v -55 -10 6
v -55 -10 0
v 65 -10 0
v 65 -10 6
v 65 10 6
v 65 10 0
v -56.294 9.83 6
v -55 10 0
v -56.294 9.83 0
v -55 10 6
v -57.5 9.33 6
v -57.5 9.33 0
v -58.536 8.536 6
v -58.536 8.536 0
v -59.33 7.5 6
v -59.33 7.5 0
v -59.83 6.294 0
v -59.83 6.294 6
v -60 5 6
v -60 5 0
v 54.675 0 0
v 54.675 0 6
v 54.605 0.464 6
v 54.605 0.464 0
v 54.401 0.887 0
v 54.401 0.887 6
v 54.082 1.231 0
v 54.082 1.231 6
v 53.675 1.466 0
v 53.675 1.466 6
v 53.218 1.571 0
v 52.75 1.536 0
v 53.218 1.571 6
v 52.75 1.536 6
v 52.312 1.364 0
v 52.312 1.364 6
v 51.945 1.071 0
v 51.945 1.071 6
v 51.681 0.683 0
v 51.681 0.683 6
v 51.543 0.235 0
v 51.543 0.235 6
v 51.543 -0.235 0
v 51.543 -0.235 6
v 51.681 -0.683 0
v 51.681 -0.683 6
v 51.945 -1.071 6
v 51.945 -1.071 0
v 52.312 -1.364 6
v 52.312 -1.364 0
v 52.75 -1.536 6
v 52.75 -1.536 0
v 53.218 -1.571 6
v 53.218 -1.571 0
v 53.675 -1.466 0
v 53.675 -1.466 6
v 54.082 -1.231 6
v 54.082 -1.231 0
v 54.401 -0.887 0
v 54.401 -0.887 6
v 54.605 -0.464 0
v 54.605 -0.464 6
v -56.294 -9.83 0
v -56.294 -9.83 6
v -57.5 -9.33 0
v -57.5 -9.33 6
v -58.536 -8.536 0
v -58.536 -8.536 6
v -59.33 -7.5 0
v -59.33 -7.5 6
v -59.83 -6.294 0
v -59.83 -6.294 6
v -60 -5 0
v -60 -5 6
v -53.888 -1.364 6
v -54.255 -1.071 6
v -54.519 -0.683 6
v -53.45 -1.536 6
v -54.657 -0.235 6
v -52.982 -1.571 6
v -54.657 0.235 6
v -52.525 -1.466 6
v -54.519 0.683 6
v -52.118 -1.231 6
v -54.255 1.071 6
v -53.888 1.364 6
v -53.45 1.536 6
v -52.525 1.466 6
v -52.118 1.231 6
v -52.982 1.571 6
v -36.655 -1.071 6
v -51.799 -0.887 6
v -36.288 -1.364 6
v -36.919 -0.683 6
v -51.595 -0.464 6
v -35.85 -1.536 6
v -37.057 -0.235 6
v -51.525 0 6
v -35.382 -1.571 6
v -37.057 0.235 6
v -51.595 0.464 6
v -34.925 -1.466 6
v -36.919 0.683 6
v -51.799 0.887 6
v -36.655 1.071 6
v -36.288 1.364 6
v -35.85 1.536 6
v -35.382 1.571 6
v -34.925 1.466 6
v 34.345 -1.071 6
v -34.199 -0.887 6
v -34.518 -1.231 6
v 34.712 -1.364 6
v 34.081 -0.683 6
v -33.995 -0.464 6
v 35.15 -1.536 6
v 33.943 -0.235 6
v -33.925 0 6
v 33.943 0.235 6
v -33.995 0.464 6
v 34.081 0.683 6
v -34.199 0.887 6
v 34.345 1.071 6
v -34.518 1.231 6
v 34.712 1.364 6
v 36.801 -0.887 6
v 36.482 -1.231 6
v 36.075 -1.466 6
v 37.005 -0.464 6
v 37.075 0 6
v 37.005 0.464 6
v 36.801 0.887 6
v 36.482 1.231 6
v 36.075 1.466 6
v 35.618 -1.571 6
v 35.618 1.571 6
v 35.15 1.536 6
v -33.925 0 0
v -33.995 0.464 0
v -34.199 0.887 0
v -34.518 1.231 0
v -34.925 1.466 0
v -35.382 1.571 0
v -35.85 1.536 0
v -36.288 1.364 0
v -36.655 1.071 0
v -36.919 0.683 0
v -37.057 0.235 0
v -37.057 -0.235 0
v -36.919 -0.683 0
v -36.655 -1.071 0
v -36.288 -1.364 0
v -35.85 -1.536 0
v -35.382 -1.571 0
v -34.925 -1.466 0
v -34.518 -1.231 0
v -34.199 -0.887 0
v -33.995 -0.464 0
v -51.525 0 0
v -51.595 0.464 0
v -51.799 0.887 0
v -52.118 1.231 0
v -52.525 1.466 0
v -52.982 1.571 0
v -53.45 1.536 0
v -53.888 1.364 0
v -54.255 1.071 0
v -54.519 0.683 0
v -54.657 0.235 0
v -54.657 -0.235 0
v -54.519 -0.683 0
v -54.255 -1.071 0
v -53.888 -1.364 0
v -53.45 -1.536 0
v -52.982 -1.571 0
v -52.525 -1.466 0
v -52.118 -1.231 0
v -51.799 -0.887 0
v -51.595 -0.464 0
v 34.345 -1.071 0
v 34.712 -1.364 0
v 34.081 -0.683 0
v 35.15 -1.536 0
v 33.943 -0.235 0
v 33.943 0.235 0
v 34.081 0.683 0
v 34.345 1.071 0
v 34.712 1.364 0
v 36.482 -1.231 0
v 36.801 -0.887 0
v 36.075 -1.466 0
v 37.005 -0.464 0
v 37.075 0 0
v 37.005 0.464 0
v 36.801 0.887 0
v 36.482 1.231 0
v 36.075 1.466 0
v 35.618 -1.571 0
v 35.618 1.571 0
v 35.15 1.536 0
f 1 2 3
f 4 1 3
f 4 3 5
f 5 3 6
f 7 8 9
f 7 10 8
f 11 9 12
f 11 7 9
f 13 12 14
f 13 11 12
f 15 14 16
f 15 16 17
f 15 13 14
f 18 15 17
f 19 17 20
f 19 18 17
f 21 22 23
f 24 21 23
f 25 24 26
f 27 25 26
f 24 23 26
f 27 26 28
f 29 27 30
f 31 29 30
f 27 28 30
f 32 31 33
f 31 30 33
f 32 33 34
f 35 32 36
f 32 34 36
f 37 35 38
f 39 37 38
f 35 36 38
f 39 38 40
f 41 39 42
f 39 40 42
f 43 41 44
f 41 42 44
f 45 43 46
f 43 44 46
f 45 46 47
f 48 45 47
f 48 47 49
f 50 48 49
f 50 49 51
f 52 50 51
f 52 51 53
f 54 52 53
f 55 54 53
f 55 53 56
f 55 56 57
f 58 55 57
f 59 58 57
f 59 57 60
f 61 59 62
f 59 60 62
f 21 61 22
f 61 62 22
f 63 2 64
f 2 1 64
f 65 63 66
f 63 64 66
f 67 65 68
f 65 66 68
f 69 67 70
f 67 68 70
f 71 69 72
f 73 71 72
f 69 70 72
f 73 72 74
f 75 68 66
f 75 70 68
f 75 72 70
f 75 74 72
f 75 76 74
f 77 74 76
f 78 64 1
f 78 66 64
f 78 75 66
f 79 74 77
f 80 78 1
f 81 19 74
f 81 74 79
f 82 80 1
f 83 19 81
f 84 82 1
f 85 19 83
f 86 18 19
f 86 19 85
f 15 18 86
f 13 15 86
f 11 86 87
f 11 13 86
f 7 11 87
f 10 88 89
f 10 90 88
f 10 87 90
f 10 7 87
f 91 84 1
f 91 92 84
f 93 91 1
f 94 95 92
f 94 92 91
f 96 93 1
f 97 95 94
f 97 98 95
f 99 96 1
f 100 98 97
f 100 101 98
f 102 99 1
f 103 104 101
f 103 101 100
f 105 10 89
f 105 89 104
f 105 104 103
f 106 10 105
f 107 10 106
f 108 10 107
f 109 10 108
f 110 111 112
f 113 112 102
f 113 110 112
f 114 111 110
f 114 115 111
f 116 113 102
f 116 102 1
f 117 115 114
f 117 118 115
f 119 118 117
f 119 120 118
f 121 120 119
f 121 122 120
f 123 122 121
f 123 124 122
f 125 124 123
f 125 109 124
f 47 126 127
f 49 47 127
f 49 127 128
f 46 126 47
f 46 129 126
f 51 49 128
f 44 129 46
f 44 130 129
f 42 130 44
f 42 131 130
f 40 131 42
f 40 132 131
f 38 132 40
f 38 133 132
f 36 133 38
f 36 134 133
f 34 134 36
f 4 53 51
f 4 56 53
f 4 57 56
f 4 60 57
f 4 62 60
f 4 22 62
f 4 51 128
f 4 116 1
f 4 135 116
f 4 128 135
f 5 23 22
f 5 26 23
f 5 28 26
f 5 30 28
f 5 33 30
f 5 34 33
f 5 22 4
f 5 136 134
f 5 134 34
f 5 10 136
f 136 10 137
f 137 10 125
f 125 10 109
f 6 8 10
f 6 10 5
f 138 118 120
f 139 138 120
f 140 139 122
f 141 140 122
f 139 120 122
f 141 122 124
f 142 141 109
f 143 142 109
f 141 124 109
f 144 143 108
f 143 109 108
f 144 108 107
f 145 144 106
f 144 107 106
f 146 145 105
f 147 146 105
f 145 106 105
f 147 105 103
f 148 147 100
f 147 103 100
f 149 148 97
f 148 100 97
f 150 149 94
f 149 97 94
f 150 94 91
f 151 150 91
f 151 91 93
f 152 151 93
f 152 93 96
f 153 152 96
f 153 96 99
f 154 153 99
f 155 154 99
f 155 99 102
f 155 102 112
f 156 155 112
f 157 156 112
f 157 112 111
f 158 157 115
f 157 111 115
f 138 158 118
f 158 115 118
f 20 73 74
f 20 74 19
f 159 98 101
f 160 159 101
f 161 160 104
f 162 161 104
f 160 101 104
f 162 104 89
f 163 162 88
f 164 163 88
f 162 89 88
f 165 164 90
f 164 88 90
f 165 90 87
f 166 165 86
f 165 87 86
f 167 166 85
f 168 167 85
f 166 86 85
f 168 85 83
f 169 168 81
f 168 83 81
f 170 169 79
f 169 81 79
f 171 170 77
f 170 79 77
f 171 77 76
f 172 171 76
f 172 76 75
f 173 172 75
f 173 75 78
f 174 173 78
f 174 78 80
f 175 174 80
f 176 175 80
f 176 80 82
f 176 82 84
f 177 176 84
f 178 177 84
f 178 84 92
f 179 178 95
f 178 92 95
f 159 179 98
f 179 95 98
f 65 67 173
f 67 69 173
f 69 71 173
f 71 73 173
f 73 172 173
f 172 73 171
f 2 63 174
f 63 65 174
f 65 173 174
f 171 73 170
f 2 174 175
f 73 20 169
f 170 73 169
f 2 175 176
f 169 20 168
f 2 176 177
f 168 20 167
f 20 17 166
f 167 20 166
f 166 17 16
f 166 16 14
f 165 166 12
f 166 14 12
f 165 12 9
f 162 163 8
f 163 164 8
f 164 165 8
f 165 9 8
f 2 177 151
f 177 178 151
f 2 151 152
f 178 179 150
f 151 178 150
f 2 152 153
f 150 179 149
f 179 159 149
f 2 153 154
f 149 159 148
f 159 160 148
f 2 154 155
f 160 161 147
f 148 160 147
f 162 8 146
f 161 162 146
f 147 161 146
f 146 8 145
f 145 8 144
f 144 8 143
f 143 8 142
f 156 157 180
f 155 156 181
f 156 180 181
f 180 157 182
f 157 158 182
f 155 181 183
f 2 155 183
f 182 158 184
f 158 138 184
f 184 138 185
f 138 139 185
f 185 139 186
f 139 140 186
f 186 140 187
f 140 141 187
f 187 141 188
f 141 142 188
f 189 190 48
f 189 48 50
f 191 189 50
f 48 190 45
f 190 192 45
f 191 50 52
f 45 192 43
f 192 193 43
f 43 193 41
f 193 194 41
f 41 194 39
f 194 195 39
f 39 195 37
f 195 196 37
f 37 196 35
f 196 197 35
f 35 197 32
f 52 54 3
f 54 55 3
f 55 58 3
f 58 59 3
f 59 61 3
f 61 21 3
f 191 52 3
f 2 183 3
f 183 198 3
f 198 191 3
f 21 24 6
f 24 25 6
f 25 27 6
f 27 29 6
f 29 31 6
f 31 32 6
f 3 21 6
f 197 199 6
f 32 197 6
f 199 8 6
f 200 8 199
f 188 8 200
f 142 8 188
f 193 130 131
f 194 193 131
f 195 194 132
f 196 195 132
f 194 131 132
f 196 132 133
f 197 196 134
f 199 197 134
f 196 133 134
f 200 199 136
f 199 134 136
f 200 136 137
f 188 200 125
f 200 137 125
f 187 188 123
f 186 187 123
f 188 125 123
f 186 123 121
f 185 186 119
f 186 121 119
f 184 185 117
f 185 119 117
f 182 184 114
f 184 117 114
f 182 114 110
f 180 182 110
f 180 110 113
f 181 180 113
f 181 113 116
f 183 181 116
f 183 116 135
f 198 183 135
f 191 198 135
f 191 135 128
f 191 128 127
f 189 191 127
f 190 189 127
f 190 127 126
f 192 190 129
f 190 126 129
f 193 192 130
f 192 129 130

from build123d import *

# Parameters (mm, degrees)
F0_W     = 120
F0_H     = 20
F1_DEPTH = 6
F2_R     = 1.575
F3_DEPTH = 6
F4_W     = 5
F4_H     = 20
F5_DEPTH = 6
F6_R     = 5


with BuildPart() as f1:
    # F0 (on Top) → F1 (new body)
    with BuildSketch(Plane.XY):
        Rectangle(F0_W, F0_H)
    extrude(amount=F1_DEPTH)

    # F2 (on face) → F3 (cut, through all)
    with BuildSketch(Plane.XY.offset(6)):
        with Locations((-53.1, 0)):
            Circle(F2_R)
        with Locations((-35.5, 0)):
            Circle(F2_R)
        with Locations((53.1, 0)):
            Circle(F2_R)
        with Locations((35.5, 0)):
            Circle(F2_R)
    extrude(amount=-F3_DEPTH, mode=Mode.SUBTRACT)

    # F4 (on Top) → F5 (join, through all)
    with BuildSketch(Plane.XY):
        with Locations((62.5, 0)):
            Rectangle(F4_W, F4_H)
    extrude(amount=F5_DEPTH)

    # F6
    f6_edges = [f1.edges().sort_by_distance(p)[0] for p in [
        (-60, -10, 3),
        (-60, 10, 3),
    ]]
    fillet(f6_edges, radius=F6_R)


solid = f1.part
